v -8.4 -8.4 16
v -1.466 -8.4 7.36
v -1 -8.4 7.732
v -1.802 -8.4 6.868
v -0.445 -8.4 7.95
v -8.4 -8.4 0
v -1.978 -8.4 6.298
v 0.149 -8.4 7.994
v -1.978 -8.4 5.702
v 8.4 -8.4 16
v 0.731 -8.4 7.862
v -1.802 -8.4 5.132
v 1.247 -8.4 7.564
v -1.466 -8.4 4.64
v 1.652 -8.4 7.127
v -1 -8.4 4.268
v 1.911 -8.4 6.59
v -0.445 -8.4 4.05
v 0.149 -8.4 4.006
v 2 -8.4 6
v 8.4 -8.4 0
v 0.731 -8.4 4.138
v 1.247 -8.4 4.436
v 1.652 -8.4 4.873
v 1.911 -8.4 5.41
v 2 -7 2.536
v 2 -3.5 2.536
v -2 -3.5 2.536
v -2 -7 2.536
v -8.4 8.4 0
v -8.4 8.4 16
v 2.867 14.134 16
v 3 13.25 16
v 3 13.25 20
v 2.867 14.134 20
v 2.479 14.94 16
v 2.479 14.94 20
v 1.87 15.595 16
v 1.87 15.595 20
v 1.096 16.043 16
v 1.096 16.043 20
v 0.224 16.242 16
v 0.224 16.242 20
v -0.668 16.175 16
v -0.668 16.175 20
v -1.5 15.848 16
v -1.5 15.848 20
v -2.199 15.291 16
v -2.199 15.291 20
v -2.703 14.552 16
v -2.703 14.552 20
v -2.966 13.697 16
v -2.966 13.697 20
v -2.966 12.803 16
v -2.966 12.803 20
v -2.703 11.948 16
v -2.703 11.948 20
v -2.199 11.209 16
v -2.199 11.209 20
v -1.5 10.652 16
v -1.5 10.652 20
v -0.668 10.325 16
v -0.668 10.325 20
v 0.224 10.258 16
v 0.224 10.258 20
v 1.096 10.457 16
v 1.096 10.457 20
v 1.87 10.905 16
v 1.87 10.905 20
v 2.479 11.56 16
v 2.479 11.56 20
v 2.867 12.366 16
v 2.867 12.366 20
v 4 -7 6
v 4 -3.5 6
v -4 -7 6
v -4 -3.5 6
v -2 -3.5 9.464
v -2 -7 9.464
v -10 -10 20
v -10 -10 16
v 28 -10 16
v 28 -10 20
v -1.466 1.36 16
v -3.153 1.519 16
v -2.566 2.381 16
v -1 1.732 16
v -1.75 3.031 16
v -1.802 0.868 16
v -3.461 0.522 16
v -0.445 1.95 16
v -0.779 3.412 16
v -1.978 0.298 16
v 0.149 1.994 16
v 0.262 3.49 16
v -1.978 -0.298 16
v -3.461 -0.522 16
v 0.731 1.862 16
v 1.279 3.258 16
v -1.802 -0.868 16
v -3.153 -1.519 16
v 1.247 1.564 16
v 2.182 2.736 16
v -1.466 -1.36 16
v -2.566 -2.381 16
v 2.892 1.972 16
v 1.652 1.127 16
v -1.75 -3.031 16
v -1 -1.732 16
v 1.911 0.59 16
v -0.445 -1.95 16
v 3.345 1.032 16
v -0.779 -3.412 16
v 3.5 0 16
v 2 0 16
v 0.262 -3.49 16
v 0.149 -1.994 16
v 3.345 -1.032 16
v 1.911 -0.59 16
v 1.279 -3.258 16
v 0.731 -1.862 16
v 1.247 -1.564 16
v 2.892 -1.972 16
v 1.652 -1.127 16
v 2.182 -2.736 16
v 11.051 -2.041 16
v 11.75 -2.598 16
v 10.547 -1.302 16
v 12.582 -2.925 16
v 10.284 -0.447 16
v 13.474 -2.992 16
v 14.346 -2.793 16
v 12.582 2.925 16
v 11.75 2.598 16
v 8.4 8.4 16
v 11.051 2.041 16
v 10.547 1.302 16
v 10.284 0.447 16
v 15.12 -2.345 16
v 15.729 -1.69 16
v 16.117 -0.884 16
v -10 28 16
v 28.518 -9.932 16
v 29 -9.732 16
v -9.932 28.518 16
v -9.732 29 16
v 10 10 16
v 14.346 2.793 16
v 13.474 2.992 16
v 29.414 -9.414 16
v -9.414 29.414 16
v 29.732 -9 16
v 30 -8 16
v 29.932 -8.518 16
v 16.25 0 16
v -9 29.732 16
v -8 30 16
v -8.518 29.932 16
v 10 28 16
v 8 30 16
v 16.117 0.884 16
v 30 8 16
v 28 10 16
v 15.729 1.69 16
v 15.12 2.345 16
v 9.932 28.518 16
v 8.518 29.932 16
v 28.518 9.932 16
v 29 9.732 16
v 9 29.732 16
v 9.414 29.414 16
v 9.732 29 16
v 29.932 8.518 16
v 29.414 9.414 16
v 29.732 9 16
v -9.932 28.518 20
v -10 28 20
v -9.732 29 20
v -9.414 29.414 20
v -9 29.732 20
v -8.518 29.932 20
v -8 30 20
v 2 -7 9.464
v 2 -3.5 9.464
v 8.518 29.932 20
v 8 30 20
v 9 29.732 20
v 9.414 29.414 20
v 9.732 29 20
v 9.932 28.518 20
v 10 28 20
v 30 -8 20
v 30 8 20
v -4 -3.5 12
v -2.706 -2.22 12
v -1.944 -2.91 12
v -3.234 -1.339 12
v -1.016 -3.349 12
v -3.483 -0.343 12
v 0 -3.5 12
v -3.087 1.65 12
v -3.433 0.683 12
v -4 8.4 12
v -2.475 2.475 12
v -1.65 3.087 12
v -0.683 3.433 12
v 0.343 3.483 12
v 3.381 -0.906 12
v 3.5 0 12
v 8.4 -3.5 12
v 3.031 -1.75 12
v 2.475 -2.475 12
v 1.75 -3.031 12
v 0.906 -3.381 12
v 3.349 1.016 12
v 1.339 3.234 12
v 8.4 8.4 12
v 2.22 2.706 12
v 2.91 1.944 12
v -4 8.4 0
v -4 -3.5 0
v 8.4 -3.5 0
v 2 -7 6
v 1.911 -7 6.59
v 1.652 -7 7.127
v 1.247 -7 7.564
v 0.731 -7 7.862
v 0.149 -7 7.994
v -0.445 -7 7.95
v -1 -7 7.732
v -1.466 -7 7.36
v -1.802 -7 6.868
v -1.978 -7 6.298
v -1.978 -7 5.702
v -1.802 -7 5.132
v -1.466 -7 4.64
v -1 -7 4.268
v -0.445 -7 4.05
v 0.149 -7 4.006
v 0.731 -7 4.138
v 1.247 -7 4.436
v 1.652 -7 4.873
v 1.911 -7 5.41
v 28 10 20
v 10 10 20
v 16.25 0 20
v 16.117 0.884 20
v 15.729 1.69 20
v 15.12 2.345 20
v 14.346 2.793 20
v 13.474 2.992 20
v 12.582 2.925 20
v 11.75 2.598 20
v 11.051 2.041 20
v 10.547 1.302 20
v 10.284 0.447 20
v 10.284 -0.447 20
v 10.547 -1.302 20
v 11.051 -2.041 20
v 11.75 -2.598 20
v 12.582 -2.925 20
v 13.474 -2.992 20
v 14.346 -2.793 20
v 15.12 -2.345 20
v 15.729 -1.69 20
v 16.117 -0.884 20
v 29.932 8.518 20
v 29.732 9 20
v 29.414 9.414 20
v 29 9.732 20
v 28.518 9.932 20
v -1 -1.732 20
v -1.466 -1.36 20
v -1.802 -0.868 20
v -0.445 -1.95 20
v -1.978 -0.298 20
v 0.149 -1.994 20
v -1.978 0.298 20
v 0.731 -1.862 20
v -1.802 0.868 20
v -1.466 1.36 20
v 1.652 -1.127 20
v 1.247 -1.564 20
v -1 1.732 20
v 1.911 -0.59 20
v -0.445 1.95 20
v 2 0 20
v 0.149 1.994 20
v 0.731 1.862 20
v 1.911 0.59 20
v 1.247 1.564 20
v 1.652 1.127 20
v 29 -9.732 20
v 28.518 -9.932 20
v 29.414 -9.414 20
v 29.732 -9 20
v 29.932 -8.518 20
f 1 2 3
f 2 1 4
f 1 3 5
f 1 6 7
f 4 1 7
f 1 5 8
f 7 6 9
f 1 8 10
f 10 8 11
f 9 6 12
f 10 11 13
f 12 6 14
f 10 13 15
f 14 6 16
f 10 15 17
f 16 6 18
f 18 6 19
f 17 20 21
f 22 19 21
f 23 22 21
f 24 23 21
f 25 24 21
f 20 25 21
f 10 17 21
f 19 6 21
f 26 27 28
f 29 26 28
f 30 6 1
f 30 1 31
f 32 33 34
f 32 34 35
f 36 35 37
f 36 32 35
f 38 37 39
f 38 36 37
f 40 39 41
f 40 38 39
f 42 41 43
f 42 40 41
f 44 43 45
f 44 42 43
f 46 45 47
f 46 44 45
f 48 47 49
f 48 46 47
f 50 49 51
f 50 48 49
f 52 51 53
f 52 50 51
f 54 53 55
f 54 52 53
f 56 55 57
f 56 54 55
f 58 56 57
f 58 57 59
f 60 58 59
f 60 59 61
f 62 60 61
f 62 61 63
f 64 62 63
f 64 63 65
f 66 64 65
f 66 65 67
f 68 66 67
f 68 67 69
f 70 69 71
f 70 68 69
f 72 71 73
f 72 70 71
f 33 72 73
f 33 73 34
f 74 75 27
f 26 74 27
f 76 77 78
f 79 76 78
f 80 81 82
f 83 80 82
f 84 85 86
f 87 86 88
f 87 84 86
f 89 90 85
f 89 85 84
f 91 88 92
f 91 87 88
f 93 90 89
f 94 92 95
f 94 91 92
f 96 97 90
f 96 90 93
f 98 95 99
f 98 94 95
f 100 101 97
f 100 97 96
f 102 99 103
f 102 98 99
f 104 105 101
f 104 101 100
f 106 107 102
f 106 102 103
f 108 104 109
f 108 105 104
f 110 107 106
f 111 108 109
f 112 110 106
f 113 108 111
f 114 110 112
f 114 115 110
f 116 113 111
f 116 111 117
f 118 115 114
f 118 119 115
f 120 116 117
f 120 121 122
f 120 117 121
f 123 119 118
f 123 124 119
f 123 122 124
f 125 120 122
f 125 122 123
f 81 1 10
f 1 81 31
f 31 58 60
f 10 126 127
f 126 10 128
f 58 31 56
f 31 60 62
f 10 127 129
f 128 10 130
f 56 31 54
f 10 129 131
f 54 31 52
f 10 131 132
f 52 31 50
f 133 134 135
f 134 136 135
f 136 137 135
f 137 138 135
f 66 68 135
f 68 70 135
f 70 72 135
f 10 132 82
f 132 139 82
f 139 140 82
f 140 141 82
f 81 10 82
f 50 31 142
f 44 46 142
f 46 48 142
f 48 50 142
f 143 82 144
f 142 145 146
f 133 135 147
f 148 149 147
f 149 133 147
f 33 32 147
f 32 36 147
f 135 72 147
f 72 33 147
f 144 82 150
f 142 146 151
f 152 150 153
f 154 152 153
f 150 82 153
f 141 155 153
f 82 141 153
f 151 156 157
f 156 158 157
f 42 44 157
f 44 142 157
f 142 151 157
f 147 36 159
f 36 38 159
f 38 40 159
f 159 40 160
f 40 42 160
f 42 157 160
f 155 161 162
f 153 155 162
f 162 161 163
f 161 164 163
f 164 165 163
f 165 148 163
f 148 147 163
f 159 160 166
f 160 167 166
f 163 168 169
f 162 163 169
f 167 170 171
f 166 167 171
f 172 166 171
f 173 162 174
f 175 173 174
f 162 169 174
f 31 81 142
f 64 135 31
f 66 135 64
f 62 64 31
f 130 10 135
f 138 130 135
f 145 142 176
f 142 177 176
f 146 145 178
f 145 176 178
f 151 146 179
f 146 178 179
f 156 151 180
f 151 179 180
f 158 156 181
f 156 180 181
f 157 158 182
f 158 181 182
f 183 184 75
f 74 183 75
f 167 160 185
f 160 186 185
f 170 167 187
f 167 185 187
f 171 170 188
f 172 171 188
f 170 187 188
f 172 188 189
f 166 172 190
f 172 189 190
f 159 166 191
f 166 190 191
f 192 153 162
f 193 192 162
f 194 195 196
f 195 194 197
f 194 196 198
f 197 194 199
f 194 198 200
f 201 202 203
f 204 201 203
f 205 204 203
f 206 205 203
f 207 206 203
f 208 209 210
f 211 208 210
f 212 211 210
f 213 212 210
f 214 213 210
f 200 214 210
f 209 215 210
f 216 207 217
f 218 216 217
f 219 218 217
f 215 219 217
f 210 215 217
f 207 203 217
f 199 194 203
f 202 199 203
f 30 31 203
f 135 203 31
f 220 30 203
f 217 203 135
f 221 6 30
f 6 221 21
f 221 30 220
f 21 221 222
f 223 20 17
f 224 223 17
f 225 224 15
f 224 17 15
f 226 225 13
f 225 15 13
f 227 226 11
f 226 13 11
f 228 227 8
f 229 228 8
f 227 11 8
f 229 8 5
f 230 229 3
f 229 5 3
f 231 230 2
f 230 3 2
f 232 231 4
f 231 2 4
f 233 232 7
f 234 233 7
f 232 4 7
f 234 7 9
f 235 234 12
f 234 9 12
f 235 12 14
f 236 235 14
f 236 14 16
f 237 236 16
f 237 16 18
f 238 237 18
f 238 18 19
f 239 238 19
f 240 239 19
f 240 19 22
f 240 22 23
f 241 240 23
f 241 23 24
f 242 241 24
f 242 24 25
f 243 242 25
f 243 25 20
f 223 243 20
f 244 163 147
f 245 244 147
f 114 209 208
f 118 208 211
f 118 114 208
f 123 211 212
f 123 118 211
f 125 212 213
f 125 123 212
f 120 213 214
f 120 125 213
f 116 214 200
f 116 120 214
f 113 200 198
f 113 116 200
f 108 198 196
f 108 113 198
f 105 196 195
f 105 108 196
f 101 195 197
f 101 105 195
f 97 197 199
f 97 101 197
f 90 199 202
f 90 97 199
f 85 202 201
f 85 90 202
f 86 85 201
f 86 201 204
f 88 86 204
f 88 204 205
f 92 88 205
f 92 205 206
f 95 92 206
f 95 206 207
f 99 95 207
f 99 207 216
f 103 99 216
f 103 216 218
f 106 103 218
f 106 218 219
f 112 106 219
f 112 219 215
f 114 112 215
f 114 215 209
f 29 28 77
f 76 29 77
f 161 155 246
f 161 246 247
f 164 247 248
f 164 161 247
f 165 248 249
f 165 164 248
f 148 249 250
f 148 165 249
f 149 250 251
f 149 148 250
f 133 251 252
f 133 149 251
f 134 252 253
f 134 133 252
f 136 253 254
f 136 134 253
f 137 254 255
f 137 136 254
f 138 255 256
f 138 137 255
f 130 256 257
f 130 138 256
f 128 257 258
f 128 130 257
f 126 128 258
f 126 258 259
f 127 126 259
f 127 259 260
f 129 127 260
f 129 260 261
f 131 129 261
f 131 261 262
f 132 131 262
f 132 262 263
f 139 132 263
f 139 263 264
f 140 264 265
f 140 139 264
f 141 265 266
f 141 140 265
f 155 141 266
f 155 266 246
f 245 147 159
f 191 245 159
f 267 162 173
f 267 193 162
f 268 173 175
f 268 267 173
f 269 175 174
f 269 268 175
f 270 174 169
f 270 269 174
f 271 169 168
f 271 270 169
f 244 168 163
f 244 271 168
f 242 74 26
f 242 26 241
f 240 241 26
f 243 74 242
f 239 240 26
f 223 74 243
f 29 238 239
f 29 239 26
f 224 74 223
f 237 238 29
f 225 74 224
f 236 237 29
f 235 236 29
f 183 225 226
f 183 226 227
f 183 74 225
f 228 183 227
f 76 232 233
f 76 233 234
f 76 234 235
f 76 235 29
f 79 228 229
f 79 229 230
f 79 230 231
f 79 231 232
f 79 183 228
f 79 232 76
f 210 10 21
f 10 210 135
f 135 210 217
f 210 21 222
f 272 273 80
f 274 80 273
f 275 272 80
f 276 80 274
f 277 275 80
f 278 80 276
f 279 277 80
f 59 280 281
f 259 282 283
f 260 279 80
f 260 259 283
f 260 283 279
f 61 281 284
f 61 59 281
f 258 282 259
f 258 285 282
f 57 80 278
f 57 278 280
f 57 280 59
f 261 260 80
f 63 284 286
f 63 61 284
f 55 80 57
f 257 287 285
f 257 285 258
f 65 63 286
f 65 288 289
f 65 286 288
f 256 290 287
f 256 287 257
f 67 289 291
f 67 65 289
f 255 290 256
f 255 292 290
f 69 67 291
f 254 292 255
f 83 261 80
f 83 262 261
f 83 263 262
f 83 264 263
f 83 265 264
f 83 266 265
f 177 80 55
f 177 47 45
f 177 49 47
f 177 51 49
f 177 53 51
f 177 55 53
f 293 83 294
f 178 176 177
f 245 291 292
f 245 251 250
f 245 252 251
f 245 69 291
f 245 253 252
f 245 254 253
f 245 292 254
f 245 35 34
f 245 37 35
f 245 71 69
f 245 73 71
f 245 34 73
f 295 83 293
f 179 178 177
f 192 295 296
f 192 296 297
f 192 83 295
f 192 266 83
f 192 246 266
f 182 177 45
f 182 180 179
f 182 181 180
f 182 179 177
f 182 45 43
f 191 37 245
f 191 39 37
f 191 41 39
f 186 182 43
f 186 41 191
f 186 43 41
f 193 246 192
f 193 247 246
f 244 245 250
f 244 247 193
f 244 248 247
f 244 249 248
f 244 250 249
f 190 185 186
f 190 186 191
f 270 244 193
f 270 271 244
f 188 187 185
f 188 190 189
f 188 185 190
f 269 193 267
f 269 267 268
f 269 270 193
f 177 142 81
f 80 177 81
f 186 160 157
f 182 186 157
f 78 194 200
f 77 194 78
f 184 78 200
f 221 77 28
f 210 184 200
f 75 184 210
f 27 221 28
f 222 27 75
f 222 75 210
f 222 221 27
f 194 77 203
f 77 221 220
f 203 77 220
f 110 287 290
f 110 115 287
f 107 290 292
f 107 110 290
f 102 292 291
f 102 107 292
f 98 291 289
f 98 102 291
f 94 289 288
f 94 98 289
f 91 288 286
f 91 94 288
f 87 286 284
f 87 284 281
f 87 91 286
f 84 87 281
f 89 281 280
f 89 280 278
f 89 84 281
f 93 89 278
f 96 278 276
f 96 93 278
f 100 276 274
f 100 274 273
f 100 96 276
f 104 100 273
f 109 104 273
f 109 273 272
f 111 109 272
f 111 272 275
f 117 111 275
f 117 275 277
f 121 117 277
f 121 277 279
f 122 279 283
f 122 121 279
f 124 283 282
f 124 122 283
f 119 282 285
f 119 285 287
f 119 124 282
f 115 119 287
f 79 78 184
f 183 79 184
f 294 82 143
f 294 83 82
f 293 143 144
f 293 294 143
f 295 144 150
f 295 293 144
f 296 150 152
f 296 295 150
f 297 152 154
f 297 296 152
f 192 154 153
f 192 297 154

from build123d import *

# Parameters (mm, degrees)
SKETCH_W        = 16.8
SKETCH_H        = 16.8
SKETCH_R        = 2
PAD_DEPTH       = 16
SKETCH002_R     = 2
SKETCH002_R_2   = 3
PAD001_DEPTH    = 4
SKETCH003_W     = 12.4
SKETCH003_H     = 11.9
POCKET001_DEPTH = 12
SKETCH001_R     = 3.5
POCKET_DEPTH    = 4
POCKET002_DEPTH = 3.5
SKETCH005_R     = 2
POCKET003_DEPTH = 38.401
FILLET_R        = 2


with BuildPart() as part:
    # Sketch → Pad (new body)
    with BuildSketch(Plane.XY):
        Rectangle(SKETCH_W, SKETCH_H)
        Circle(SKETCH_R, mode=Mode.SUBTRACT)
    extrude(amount=PAD_DEPTH)

    # Sketch002 → Pad001 (join)
    with BuildSketch(Plane.XY.offset(16)):
        Polygon((-10, -10), (30, -10), (30, 10), (10, 10), (10, 30), (-10, 30), align=None)
        Circle(SKETCH002_R, mode=Mode.SUBTRACT)
        with Locations((0, 13.25)):
            Circle(SKETCH002_R_2, mode=Mode.SUBTRACT)
        with Locations((13.25, 0)):
            Circle(SKETCH002_R_2, mode=Mode.SUBTRACT)
    extrude(amount=PAD001_DEPTH)

    # Sketch003 → Pocket001 (cut)
    with BuildSketch(Plane.XY):
        with Locations((2.2, 2.45)):
            Rectangle(SKETCH003_W, SKETCH003_H)
    extrude(amount=POCKET001_DEPTH, mode=Mode.SUBTRACT)

    # Sketch001 (on Face5 of Pocket001) → Pocket (cut)
    with BuildSketch(Plane(origin=(0, 0, 16), x_dir=(1, 0, 0), z_dir=(0, 0, -1))):
        Circle(SKETCH001_R)
    extrude(amount=POCKET_DEPTH, mode=Mode.SUBTRACT)

    # Sketch004 (on Face7 of Pocket) → Pocket002 (cut)
    with BuildSketch(Plane(origin=(0, -3.5, 0), x_dir=(-1, 0, 0), z_dir=(0, 1, 0))):
        Polygon((4, 6), (2, 9.464102), (-2, 9.464102), (-4, 6), (-2, 2.535898), (2, 2.535898), align=None)
    extrude(amount=-POCKET002_DEPTH, mode=Mode.SUBTRACT)

    # Sketch005 (on Face1 of Pocket002) → Pocket003 (cut, through all)
    with BuildSketch(Plane.XZ.offset(8.4)):
        with Locations((0, 6)):
            Circle(SKETCH005_R)
    extrude(amount=-POCKET003_DEPTH, mode=Mode.SUBTRACT)

    # Fillet
    fillet_edges = [part.edges().sort_by_distance(p)[0] for p in [
        (-10, 30, 18),
        (10, 30, 18),
        (30, 10, 18),
        (30, -10, 18),
    ]]
    fillet(fillet_edges, radius=FILLET_R)


solid = part.part
